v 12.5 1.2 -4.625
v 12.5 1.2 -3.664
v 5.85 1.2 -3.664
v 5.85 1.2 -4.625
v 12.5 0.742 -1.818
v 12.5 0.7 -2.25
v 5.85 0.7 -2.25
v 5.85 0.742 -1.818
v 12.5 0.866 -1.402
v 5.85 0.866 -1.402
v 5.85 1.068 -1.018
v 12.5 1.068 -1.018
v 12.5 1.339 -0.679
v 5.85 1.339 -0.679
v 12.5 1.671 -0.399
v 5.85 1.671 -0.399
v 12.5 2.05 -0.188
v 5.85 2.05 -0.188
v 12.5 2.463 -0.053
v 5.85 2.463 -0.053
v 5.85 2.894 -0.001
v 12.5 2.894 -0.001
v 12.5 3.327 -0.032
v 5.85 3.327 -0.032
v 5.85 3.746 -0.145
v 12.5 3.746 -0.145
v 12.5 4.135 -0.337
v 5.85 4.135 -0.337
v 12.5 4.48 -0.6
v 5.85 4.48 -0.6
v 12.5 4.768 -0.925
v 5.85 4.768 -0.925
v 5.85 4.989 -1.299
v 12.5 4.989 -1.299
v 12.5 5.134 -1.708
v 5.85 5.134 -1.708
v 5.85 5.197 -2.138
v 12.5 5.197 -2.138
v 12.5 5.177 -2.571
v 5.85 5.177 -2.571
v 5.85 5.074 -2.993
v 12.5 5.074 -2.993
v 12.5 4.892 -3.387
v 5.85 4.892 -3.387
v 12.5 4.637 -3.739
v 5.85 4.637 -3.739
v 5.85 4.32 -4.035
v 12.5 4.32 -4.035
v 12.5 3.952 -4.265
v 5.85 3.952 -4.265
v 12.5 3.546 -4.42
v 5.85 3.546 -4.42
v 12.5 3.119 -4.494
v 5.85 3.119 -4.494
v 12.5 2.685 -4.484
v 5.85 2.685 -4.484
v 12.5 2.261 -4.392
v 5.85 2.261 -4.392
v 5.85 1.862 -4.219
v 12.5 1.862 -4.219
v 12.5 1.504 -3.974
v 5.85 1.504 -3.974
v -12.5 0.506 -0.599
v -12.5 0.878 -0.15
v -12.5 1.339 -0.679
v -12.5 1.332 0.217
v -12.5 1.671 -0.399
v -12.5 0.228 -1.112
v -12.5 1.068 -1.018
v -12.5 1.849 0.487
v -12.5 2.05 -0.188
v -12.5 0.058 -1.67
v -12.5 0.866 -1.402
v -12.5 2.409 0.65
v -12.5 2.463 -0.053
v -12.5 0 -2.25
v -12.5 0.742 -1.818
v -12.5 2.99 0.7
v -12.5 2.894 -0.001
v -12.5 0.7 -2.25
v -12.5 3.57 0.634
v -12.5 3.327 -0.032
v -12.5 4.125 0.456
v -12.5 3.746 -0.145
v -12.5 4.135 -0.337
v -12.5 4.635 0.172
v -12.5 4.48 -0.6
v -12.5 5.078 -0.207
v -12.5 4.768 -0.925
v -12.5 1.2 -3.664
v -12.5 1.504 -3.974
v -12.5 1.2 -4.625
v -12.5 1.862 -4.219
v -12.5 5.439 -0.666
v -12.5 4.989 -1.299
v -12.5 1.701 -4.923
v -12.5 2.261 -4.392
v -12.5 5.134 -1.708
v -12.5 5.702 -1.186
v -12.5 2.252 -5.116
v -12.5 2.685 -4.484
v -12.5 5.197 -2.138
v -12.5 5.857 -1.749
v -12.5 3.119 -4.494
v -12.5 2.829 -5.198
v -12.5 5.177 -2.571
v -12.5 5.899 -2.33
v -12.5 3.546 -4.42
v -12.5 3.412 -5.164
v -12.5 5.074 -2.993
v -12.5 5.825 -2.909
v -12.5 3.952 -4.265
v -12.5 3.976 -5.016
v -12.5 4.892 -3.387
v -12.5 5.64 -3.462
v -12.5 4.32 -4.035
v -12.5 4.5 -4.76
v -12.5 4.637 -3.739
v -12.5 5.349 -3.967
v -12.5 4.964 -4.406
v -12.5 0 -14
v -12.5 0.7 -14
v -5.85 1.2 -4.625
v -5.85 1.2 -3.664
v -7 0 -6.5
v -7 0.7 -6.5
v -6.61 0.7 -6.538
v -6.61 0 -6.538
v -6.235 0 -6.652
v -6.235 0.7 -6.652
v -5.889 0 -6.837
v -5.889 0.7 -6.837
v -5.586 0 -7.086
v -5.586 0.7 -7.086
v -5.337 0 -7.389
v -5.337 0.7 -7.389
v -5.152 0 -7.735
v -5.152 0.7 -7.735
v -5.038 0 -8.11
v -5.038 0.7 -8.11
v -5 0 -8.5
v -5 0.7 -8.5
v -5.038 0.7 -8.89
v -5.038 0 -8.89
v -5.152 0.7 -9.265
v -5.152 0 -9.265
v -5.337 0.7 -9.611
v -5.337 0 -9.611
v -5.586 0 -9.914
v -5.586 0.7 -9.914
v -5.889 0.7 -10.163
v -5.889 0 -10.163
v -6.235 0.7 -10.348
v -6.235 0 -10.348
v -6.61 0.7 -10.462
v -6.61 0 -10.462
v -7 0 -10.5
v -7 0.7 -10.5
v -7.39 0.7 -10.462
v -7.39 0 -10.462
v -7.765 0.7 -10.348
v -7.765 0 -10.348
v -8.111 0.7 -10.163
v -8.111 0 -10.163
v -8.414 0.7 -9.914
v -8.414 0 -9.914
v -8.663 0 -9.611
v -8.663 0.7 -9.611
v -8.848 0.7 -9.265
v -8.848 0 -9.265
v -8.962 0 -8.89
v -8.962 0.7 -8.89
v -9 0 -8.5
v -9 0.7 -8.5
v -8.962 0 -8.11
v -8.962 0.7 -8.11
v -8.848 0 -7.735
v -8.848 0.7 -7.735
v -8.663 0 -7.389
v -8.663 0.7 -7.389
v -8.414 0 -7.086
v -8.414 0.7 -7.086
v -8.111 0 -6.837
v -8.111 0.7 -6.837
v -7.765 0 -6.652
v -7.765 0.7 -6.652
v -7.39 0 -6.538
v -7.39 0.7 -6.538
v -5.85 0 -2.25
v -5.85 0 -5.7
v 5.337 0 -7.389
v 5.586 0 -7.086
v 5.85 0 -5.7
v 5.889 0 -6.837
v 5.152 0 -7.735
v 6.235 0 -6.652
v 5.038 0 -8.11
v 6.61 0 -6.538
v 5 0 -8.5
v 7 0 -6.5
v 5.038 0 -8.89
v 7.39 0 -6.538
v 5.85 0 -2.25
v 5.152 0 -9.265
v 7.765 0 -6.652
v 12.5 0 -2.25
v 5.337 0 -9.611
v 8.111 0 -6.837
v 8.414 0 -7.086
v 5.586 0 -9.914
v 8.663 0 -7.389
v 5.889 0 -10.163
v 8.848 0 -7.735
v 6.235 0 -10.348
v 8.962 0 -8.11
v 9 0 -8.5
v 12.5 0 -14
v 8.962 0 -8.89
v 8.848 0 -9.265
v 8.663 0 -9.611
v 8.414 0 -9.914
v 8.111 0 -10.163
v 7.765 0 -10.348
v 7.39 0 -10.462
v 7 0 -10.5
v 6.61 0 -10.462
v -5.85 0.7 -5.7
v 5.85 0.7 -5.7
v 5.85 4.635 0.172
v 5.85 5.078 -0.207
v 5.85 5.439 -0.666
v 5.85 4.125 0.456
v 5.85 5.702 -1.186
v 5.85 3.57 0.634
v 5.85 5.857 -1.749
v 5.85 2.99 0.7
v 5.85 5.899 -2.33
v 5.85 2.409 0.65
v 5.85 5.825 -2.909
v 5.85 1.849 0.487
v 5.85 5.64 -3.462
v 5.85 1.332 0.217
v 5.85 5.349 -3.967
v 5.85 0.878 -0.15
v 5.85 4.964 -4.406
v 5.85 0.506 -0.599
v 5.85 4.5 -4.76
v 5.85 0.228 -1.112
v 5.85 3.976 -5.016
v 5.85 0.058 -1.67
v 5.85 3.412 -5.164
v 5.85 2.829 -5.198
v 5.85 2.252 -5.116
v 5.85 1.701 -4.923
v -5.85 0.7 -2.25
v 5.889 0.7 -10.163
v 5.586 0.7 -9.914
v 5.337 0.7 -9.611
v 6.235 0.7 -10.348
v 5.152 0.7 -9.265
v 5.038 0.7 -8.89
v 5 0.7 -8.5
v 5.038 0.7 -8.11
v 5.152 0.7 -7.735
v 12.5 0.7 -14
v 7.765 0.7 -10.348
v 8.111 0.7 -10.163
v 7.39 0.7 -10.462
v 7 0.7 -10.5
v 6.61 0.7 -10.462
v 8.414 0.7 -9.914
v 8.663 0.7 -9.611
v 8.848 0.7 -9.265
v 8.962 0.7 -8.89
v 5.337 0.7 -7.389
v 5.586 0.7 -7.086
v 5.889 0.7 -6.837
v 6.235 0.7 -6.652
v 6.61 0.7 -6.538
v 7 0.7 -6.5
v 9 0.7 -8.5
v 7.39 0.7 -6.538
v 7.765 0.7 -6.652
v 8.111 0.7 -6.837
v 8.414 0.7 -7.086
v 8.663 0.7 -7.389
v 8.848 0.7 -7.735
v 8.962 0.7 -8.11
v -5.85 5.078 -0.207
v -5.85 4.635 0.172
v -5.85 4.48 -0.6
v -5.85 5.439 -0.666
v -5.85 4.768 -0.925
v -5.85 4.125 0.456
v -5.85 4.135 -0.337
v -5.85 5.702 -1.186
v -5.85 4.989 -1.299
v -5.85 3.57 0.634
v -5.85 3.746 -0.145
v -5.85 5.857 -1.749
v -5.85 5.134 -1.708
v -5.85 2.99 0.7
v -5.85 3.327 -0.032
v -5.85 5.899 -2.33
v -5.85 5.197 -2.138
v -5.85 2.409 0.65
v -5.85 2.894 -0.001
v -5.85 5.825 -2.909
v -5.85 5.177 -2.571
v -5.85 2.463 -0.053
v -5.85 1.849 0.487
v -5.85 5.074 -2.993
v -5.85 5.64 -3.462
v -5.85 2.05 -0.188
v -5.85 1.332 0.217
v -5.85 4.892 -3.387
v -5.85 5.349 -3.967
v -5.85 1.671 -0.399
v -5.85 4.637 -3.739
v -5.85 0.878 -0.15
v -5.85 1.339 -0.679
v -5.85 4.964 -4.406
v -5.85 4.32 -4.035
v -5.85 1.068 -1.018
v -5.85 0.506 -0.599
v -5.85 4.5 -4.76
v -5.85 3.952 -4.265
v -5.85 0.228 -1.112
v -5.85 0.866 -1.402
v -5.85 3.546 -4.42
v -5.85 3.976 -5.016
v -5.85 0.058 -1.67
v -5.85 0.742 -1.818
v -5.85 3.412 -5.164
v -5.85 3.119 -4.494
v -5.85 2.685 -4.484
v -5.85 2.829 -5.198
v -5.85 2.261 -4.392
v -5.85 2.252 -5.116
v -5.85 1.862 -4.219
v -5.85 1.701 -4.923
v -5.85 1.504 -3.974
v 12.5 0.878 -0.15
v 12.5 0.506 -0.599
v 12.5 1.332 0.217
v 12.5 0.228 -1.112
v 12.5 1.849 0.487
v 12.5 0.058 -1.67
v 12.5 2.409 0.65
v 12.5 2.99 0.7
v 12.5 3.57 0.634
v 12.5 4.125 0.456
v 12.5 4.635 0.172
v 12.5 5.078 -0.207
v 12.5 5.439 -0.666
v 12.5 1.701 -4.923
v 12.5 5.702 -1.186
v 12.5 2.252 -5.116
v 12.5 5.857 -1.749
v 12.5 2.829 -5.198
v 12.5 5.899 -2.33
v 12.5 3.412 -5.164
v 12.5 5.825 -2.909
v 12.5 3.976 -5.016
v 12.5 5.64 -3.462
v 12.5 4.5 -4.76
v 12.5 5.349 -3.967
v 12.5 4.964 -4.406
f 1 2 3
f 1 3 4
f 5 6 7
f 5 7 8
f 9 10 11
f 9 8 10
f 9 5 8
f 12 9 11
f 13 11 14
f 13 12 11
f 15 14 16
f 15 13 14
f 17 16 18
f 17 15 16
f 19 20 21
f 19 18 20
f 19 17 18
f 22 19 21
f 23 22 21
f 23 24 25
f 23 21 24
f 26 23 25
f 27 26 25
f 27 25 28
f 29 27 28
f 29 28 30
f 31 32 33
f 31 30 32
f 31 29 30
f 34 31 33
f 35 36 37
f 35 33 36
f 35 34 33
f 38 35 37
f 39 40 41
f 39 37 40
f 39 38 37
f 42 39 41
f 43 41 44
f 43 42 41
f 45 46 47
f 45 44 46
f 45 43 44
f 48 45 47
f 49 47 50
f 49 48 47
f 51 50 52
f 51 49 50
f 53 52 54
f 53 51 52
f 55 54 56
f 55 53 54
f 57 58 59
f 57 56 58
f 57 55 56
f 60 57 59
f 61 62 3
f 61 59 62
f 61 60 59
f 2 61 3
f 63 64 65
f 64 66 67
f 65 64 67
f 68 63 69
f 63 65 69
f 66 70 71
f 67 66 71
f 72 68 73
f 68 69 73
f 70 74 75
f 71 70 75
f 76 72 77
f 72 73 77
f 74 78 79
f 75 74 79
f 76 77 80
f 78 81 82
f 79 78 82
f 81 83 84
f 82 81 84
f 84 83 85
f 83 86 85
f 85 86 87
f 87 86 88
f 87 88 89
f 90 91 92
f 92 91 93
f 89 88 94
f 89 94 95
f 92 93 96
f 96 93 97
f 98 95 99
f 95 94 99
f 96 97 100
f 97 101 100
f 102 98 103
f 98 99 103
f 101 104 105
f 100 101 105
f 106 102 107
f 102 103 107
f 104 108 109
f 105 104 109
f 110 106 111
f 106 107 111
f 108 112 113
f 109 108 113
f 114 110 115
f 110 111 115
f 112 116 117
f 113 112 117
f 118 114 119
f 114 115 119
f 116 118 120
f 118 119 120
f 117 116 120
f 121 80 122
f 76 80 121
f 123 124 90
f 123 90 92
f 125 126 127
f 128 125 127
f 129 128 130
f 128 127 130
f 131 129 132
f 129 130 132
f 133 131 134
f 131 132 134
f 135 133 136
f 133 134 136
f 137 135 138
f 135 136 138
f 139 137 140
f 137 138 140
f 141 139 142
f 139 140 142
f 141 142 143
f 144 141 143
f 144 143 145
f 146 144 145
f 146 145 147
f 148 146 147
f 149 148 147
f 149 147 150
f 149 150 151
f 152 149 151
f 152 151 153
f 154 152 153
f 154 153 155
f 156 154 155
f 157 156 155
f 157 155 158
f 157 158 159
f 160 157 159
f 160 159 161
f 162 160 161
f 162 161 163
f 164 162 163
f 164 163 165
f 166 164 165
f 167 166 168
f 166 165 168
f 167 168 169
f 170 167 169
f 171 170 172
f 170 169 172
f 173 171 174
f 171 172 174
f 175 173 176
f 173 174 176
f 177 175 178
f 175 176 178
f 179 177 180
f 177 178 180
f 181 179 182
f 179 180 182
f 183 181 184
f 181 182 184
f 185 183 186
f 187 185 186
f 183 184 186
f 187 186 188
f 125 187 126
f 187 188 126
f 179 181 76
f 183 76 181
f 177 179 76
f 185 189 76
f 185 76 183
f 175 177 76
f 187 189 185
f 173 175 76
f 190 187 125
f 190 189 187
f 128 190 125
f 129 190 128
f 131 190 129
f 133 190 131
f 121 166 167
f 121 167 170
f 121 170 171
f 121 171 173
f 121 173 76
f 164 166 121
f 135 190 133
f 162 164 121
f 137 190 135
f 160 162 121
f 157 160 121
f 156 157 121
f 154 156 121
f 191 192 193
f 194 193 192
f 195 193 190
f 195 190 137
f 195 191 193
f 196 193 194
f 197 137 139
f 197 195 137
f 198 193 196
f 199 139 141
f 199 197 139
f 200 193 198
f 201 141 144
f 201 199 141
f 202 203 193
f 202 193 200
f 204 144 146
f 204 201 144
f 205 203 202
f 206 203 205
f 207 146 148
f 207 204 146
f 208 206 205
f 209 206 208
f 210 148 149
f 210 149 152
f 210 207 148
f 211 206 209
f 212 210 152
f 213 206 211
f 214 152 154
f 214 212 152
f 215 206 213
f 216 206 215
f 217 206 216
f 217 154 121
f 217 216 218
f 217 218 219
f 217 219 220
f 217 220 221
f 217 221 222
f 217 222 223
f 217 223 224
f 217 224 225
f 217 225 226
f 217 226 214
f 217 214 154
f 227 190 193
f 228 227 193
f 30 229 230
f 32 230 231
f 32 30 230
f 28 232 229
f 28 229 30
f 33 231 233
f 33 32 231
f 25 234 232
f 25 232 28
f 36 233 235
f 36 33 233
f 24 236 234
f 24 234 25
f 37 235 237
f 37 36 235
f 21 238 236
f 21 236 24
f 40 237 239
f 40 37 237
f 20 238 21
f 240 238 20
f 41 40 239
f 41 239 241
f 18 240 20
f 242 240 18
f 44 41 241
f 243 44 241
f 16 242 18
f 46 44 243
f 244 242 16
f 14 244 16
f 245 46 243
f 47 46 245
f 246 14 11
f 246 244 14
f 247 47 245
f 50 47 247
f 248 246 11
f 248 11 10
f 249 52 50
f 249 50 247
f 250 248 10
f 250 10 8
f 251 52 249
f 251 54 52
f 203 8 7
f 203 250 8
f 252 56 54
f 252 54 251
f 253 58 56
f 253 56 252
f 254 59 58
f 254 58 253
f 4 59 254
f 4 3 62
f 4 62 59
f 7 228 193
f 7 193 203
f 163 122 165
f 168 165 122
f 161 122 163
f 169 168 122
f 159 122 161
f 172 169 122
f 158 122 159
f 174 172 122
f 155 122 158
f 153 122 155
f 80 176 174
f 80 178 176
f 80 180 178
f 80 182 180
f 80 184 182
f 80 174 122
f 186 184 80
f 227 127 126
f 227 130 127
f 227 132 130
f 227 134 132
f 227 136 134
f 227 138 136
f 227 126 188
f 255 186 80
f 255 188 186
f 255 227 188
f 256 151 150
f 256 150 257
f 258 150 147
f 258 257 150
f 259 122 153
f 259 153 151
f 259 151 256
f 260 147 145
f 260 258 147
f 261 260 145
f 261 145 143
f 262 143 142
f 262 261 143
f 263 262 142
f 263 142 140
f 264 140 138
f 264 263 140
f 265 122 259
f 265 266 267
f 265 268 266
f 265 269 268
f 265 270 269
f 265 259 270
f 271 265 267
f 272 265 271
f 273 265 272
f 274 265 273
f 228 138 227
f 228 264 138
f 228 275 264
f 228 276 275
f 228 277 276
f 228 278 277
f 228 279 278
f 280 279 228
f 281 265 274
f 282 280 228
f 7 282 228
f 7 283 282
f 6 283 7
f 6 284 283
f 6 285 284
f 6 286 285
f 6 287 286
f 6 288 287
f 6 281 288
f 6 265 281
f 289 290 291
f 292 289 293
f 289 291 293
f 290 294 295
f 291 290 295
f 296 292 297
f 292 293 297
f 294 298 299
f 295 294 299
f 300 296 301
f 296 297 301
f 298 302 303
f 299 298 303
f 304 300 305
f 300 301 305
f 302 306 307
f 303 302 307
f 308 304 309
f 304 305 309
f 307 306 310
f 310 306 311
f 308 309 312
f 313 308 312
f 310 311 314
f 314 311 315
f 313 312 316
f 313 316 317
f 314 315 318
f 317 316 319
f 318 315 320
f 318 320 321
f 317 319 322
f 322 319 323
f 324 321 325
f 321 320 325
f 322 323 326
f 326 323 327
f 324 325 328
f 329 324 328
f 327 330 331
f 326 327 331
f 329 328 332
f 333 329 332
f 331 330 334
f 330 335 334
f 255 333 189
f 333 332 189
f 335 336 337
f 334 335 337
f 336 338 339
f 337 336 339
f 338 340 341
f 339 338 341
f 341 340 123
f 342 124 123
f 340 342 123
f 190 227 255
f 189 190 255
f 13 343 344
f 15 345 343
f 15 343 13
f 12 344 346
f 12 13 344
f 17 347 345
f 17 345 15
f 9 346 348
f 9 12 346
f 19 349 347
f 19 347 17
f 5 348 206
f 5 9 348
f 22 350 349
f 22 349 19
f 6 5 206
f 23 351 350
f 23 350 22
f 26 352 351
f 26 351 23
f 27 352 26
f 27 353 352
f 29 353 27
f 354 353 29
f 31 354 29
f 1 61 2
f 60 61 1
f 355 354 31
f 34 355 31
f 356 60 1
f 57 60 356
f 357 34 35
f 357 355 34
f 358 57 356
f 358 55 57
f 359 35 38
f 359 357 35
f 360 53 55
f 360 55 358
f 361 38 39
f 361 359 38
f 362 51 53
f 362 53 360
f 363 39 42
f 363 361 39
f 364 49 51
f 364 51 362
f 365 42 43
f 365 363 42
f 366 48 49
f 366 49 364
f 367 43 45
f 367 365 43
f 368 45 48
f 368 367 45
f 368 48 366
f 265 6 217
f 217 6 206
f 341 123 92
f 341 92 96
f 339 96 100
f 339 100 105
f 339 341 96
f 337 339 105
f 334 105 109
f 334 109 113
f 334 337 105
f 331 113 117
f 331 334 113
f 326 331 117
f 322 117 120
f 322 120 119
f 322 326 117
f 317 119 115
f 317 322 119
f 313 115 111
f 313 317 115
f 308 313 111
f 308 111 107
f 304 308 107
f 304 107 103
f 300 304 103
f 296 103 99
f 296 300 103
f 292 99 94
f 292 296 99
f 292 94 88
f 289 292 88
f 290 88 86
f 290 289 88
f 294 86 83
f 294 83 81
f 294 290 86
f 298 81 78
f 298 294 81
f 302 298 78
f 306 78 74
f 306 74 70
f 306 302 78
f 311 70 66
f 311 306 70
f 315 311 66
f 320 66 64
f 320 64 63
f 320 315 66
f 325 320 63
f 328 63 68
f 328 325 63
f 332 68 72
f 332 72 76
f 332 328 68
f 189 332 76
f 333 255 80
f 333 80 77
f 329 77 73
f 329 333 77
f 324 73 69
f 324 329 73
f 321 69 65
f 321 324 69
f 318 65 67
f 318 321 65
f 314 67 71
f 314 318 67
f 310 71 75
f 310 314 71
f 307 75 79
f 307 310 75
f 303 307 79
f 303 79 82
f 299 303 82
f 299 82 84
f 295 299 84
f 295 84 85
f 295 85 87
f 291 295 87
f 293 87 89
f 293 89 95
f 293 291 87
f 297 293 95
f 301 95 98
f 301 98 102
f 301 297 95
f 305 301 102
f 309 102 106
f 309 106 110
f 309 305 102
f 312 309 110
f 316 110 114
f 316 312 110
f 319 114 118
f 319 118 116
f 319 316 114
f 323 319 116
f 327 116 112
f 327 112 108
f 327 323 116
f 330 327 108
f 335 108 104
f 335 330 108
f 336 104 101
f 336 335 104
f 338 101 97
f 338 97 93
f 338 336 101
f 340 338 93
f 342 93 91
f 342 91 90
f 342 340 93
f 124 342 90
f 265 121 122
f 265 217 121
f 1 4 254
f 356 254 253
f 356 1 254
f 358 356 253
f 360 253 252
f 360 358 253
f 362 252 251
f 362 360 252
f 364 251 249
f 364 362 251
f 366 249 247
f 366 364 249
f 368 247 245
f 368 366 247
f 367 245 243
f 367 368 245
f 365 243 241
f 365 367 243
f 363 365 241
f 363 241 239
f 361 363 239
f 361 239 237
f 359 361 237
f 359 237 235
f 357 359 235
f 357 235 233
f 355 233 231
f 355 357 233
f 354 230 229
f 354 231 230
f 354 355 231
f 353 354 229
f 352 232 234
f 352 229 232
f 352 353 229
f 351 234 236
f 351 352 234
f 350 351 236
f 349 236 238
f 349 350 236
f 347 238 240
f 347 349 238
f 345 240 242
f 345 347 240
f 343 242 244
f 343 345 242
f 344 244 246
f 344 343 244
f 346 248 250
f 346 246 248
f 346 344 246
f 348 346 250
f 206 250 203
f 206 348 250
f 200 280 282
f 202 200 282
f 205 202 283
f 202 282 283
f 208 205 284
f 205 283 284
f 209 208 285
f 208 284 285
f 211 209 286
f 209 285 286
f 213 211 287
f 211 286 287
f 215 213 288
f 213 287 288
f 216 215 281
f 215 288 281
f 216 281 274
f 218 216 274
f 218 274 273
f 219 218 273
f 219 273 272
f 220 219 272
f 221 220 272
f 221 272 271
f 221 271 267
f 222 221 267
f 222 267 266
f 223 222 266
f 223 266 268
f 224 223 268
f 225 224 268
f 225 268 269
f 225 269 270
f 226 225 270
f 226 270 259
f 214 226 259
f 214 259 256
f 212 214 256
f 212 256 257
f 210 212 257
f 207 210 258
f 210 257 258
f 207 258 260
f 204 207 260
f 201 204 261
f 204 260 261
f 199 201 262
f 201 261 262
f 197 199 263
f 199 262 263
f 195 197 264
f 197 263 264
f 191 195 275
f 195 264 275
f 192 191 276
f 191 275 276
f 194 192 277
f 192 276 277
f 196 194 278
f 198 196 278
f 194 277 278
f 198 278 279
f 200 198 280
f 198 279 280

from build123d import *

# Parameters (mm, degrees)
SALIENTE_EXTRUIR1_DEPTH    = 12.5
CORTAR_EXTRUIR1_REACH      = 21.475
CROQUIS5_R                 = 2
CORTAR_EXTRUIR2_DEPTH      = 20.475369059
CORTAR_EXTRUIR2_DEPTH_BACK = 20.475369059
CROQUIS6_W                 = 11.7
CROQUIS6_H                 = 6.4


with BuildPart() as part:
    # Croquis4 → Saliente-Extruir1 (new, symmetric)
    with BuildSketch(Plane(origin=(0, 0, 0), x_dir=(0, 0, -1), z_dir=(1, 0, 0))):
        with BuildLine():
            Line((14, 0), (14, 0.7))
            Line((14, 0.7), (2.25, 0.7))
            ThreePointArc((2.25, 0.7), (1.5, 5.071320344), (3.664213562, 1.2))
            Line((3.664213562, 1.2), (4.624868417, 1.2))
            ThreePointArc((4.624868417, 1.2), (0.91958653, 5.582964109), (2.25, 0))
            Line((2.25, 0), (14, 0))
        make_face()
    extrude(amount=SALIENTE_EXTRUIR1_DEPTH, both=True)

    # Croquis5 → Cortar-Extruir1 (cut, up to next)
    with BuildSketch(Plane(origin=(0, 0.7, 0), x_dir=(1, 0, 0), z_dir=(0, 1, 0)), mode=Mode.PRIVATE) as cortar_extruir1_sk1:
        with Locations(Location((7, 8.5, 0), (0, 0, 270))):
            Circle(CROQUIS5_R)
    cortar_extruir1_tool1 = extrude(cortar_extruir1_sk1.sketch, amount=-CORTAR_EXTRUIR1_REACH, mode=Mode.PRIVATE) & part.part
    # Croquis5 → Cortar-Extruir1 (cut, up to next)
    with BuildSketch(Plane(origin=(0, 0.7, 0), x_dir=(1, 0, 0), z_dir=(0, 1, 0)), mode=Mode.PRIVATE) as cortar_extruir1_sk2:
        with Locations(Location((-7, 8.5, 0), (0, 0, 270))):
            Circle(CROQUIS5_R)
    cortar_extruir1_tool2 = extrude(cortar_extruir1_sk2.sketch, amount=-CORTAR_EXTRUIR1_REACH, mode=Mode.PRIVATE) & part.part
    add(cortar_extruir1_tool1.solids().sort_by_distance((7, 0.7, -8.5))[0], mode=Mode.SUBTRACT)
    add(cortar_extruir1_tool2.solids().sort_by_distance((-7, 0.7, -8.5))[0], mode=Mode.SUBTRACT)

    # Croquis6 → Cortar-Extruir2 (cut, two sides: drawn at the far end of the back side and taken through both)
    with BuildSketch(Plane(origin=(0, 0.7, 0), x_dir=(1, 0, 0), z_dir=(0, 1, 0)).offset(-CORTAR_EXTRUIR2_DEPTH_BACK)):
        with Locations((0, 2.5)):
            Rectangle(CROQUIS6_W, CROQUIS6_H)
    extrude(amount=CORTAR_EXTRUIR2_DEPTH + CORTAR_EXTRUIR2_DEPTH_BACK, mode=Mode.SUBTRACT)


solid = part.part
